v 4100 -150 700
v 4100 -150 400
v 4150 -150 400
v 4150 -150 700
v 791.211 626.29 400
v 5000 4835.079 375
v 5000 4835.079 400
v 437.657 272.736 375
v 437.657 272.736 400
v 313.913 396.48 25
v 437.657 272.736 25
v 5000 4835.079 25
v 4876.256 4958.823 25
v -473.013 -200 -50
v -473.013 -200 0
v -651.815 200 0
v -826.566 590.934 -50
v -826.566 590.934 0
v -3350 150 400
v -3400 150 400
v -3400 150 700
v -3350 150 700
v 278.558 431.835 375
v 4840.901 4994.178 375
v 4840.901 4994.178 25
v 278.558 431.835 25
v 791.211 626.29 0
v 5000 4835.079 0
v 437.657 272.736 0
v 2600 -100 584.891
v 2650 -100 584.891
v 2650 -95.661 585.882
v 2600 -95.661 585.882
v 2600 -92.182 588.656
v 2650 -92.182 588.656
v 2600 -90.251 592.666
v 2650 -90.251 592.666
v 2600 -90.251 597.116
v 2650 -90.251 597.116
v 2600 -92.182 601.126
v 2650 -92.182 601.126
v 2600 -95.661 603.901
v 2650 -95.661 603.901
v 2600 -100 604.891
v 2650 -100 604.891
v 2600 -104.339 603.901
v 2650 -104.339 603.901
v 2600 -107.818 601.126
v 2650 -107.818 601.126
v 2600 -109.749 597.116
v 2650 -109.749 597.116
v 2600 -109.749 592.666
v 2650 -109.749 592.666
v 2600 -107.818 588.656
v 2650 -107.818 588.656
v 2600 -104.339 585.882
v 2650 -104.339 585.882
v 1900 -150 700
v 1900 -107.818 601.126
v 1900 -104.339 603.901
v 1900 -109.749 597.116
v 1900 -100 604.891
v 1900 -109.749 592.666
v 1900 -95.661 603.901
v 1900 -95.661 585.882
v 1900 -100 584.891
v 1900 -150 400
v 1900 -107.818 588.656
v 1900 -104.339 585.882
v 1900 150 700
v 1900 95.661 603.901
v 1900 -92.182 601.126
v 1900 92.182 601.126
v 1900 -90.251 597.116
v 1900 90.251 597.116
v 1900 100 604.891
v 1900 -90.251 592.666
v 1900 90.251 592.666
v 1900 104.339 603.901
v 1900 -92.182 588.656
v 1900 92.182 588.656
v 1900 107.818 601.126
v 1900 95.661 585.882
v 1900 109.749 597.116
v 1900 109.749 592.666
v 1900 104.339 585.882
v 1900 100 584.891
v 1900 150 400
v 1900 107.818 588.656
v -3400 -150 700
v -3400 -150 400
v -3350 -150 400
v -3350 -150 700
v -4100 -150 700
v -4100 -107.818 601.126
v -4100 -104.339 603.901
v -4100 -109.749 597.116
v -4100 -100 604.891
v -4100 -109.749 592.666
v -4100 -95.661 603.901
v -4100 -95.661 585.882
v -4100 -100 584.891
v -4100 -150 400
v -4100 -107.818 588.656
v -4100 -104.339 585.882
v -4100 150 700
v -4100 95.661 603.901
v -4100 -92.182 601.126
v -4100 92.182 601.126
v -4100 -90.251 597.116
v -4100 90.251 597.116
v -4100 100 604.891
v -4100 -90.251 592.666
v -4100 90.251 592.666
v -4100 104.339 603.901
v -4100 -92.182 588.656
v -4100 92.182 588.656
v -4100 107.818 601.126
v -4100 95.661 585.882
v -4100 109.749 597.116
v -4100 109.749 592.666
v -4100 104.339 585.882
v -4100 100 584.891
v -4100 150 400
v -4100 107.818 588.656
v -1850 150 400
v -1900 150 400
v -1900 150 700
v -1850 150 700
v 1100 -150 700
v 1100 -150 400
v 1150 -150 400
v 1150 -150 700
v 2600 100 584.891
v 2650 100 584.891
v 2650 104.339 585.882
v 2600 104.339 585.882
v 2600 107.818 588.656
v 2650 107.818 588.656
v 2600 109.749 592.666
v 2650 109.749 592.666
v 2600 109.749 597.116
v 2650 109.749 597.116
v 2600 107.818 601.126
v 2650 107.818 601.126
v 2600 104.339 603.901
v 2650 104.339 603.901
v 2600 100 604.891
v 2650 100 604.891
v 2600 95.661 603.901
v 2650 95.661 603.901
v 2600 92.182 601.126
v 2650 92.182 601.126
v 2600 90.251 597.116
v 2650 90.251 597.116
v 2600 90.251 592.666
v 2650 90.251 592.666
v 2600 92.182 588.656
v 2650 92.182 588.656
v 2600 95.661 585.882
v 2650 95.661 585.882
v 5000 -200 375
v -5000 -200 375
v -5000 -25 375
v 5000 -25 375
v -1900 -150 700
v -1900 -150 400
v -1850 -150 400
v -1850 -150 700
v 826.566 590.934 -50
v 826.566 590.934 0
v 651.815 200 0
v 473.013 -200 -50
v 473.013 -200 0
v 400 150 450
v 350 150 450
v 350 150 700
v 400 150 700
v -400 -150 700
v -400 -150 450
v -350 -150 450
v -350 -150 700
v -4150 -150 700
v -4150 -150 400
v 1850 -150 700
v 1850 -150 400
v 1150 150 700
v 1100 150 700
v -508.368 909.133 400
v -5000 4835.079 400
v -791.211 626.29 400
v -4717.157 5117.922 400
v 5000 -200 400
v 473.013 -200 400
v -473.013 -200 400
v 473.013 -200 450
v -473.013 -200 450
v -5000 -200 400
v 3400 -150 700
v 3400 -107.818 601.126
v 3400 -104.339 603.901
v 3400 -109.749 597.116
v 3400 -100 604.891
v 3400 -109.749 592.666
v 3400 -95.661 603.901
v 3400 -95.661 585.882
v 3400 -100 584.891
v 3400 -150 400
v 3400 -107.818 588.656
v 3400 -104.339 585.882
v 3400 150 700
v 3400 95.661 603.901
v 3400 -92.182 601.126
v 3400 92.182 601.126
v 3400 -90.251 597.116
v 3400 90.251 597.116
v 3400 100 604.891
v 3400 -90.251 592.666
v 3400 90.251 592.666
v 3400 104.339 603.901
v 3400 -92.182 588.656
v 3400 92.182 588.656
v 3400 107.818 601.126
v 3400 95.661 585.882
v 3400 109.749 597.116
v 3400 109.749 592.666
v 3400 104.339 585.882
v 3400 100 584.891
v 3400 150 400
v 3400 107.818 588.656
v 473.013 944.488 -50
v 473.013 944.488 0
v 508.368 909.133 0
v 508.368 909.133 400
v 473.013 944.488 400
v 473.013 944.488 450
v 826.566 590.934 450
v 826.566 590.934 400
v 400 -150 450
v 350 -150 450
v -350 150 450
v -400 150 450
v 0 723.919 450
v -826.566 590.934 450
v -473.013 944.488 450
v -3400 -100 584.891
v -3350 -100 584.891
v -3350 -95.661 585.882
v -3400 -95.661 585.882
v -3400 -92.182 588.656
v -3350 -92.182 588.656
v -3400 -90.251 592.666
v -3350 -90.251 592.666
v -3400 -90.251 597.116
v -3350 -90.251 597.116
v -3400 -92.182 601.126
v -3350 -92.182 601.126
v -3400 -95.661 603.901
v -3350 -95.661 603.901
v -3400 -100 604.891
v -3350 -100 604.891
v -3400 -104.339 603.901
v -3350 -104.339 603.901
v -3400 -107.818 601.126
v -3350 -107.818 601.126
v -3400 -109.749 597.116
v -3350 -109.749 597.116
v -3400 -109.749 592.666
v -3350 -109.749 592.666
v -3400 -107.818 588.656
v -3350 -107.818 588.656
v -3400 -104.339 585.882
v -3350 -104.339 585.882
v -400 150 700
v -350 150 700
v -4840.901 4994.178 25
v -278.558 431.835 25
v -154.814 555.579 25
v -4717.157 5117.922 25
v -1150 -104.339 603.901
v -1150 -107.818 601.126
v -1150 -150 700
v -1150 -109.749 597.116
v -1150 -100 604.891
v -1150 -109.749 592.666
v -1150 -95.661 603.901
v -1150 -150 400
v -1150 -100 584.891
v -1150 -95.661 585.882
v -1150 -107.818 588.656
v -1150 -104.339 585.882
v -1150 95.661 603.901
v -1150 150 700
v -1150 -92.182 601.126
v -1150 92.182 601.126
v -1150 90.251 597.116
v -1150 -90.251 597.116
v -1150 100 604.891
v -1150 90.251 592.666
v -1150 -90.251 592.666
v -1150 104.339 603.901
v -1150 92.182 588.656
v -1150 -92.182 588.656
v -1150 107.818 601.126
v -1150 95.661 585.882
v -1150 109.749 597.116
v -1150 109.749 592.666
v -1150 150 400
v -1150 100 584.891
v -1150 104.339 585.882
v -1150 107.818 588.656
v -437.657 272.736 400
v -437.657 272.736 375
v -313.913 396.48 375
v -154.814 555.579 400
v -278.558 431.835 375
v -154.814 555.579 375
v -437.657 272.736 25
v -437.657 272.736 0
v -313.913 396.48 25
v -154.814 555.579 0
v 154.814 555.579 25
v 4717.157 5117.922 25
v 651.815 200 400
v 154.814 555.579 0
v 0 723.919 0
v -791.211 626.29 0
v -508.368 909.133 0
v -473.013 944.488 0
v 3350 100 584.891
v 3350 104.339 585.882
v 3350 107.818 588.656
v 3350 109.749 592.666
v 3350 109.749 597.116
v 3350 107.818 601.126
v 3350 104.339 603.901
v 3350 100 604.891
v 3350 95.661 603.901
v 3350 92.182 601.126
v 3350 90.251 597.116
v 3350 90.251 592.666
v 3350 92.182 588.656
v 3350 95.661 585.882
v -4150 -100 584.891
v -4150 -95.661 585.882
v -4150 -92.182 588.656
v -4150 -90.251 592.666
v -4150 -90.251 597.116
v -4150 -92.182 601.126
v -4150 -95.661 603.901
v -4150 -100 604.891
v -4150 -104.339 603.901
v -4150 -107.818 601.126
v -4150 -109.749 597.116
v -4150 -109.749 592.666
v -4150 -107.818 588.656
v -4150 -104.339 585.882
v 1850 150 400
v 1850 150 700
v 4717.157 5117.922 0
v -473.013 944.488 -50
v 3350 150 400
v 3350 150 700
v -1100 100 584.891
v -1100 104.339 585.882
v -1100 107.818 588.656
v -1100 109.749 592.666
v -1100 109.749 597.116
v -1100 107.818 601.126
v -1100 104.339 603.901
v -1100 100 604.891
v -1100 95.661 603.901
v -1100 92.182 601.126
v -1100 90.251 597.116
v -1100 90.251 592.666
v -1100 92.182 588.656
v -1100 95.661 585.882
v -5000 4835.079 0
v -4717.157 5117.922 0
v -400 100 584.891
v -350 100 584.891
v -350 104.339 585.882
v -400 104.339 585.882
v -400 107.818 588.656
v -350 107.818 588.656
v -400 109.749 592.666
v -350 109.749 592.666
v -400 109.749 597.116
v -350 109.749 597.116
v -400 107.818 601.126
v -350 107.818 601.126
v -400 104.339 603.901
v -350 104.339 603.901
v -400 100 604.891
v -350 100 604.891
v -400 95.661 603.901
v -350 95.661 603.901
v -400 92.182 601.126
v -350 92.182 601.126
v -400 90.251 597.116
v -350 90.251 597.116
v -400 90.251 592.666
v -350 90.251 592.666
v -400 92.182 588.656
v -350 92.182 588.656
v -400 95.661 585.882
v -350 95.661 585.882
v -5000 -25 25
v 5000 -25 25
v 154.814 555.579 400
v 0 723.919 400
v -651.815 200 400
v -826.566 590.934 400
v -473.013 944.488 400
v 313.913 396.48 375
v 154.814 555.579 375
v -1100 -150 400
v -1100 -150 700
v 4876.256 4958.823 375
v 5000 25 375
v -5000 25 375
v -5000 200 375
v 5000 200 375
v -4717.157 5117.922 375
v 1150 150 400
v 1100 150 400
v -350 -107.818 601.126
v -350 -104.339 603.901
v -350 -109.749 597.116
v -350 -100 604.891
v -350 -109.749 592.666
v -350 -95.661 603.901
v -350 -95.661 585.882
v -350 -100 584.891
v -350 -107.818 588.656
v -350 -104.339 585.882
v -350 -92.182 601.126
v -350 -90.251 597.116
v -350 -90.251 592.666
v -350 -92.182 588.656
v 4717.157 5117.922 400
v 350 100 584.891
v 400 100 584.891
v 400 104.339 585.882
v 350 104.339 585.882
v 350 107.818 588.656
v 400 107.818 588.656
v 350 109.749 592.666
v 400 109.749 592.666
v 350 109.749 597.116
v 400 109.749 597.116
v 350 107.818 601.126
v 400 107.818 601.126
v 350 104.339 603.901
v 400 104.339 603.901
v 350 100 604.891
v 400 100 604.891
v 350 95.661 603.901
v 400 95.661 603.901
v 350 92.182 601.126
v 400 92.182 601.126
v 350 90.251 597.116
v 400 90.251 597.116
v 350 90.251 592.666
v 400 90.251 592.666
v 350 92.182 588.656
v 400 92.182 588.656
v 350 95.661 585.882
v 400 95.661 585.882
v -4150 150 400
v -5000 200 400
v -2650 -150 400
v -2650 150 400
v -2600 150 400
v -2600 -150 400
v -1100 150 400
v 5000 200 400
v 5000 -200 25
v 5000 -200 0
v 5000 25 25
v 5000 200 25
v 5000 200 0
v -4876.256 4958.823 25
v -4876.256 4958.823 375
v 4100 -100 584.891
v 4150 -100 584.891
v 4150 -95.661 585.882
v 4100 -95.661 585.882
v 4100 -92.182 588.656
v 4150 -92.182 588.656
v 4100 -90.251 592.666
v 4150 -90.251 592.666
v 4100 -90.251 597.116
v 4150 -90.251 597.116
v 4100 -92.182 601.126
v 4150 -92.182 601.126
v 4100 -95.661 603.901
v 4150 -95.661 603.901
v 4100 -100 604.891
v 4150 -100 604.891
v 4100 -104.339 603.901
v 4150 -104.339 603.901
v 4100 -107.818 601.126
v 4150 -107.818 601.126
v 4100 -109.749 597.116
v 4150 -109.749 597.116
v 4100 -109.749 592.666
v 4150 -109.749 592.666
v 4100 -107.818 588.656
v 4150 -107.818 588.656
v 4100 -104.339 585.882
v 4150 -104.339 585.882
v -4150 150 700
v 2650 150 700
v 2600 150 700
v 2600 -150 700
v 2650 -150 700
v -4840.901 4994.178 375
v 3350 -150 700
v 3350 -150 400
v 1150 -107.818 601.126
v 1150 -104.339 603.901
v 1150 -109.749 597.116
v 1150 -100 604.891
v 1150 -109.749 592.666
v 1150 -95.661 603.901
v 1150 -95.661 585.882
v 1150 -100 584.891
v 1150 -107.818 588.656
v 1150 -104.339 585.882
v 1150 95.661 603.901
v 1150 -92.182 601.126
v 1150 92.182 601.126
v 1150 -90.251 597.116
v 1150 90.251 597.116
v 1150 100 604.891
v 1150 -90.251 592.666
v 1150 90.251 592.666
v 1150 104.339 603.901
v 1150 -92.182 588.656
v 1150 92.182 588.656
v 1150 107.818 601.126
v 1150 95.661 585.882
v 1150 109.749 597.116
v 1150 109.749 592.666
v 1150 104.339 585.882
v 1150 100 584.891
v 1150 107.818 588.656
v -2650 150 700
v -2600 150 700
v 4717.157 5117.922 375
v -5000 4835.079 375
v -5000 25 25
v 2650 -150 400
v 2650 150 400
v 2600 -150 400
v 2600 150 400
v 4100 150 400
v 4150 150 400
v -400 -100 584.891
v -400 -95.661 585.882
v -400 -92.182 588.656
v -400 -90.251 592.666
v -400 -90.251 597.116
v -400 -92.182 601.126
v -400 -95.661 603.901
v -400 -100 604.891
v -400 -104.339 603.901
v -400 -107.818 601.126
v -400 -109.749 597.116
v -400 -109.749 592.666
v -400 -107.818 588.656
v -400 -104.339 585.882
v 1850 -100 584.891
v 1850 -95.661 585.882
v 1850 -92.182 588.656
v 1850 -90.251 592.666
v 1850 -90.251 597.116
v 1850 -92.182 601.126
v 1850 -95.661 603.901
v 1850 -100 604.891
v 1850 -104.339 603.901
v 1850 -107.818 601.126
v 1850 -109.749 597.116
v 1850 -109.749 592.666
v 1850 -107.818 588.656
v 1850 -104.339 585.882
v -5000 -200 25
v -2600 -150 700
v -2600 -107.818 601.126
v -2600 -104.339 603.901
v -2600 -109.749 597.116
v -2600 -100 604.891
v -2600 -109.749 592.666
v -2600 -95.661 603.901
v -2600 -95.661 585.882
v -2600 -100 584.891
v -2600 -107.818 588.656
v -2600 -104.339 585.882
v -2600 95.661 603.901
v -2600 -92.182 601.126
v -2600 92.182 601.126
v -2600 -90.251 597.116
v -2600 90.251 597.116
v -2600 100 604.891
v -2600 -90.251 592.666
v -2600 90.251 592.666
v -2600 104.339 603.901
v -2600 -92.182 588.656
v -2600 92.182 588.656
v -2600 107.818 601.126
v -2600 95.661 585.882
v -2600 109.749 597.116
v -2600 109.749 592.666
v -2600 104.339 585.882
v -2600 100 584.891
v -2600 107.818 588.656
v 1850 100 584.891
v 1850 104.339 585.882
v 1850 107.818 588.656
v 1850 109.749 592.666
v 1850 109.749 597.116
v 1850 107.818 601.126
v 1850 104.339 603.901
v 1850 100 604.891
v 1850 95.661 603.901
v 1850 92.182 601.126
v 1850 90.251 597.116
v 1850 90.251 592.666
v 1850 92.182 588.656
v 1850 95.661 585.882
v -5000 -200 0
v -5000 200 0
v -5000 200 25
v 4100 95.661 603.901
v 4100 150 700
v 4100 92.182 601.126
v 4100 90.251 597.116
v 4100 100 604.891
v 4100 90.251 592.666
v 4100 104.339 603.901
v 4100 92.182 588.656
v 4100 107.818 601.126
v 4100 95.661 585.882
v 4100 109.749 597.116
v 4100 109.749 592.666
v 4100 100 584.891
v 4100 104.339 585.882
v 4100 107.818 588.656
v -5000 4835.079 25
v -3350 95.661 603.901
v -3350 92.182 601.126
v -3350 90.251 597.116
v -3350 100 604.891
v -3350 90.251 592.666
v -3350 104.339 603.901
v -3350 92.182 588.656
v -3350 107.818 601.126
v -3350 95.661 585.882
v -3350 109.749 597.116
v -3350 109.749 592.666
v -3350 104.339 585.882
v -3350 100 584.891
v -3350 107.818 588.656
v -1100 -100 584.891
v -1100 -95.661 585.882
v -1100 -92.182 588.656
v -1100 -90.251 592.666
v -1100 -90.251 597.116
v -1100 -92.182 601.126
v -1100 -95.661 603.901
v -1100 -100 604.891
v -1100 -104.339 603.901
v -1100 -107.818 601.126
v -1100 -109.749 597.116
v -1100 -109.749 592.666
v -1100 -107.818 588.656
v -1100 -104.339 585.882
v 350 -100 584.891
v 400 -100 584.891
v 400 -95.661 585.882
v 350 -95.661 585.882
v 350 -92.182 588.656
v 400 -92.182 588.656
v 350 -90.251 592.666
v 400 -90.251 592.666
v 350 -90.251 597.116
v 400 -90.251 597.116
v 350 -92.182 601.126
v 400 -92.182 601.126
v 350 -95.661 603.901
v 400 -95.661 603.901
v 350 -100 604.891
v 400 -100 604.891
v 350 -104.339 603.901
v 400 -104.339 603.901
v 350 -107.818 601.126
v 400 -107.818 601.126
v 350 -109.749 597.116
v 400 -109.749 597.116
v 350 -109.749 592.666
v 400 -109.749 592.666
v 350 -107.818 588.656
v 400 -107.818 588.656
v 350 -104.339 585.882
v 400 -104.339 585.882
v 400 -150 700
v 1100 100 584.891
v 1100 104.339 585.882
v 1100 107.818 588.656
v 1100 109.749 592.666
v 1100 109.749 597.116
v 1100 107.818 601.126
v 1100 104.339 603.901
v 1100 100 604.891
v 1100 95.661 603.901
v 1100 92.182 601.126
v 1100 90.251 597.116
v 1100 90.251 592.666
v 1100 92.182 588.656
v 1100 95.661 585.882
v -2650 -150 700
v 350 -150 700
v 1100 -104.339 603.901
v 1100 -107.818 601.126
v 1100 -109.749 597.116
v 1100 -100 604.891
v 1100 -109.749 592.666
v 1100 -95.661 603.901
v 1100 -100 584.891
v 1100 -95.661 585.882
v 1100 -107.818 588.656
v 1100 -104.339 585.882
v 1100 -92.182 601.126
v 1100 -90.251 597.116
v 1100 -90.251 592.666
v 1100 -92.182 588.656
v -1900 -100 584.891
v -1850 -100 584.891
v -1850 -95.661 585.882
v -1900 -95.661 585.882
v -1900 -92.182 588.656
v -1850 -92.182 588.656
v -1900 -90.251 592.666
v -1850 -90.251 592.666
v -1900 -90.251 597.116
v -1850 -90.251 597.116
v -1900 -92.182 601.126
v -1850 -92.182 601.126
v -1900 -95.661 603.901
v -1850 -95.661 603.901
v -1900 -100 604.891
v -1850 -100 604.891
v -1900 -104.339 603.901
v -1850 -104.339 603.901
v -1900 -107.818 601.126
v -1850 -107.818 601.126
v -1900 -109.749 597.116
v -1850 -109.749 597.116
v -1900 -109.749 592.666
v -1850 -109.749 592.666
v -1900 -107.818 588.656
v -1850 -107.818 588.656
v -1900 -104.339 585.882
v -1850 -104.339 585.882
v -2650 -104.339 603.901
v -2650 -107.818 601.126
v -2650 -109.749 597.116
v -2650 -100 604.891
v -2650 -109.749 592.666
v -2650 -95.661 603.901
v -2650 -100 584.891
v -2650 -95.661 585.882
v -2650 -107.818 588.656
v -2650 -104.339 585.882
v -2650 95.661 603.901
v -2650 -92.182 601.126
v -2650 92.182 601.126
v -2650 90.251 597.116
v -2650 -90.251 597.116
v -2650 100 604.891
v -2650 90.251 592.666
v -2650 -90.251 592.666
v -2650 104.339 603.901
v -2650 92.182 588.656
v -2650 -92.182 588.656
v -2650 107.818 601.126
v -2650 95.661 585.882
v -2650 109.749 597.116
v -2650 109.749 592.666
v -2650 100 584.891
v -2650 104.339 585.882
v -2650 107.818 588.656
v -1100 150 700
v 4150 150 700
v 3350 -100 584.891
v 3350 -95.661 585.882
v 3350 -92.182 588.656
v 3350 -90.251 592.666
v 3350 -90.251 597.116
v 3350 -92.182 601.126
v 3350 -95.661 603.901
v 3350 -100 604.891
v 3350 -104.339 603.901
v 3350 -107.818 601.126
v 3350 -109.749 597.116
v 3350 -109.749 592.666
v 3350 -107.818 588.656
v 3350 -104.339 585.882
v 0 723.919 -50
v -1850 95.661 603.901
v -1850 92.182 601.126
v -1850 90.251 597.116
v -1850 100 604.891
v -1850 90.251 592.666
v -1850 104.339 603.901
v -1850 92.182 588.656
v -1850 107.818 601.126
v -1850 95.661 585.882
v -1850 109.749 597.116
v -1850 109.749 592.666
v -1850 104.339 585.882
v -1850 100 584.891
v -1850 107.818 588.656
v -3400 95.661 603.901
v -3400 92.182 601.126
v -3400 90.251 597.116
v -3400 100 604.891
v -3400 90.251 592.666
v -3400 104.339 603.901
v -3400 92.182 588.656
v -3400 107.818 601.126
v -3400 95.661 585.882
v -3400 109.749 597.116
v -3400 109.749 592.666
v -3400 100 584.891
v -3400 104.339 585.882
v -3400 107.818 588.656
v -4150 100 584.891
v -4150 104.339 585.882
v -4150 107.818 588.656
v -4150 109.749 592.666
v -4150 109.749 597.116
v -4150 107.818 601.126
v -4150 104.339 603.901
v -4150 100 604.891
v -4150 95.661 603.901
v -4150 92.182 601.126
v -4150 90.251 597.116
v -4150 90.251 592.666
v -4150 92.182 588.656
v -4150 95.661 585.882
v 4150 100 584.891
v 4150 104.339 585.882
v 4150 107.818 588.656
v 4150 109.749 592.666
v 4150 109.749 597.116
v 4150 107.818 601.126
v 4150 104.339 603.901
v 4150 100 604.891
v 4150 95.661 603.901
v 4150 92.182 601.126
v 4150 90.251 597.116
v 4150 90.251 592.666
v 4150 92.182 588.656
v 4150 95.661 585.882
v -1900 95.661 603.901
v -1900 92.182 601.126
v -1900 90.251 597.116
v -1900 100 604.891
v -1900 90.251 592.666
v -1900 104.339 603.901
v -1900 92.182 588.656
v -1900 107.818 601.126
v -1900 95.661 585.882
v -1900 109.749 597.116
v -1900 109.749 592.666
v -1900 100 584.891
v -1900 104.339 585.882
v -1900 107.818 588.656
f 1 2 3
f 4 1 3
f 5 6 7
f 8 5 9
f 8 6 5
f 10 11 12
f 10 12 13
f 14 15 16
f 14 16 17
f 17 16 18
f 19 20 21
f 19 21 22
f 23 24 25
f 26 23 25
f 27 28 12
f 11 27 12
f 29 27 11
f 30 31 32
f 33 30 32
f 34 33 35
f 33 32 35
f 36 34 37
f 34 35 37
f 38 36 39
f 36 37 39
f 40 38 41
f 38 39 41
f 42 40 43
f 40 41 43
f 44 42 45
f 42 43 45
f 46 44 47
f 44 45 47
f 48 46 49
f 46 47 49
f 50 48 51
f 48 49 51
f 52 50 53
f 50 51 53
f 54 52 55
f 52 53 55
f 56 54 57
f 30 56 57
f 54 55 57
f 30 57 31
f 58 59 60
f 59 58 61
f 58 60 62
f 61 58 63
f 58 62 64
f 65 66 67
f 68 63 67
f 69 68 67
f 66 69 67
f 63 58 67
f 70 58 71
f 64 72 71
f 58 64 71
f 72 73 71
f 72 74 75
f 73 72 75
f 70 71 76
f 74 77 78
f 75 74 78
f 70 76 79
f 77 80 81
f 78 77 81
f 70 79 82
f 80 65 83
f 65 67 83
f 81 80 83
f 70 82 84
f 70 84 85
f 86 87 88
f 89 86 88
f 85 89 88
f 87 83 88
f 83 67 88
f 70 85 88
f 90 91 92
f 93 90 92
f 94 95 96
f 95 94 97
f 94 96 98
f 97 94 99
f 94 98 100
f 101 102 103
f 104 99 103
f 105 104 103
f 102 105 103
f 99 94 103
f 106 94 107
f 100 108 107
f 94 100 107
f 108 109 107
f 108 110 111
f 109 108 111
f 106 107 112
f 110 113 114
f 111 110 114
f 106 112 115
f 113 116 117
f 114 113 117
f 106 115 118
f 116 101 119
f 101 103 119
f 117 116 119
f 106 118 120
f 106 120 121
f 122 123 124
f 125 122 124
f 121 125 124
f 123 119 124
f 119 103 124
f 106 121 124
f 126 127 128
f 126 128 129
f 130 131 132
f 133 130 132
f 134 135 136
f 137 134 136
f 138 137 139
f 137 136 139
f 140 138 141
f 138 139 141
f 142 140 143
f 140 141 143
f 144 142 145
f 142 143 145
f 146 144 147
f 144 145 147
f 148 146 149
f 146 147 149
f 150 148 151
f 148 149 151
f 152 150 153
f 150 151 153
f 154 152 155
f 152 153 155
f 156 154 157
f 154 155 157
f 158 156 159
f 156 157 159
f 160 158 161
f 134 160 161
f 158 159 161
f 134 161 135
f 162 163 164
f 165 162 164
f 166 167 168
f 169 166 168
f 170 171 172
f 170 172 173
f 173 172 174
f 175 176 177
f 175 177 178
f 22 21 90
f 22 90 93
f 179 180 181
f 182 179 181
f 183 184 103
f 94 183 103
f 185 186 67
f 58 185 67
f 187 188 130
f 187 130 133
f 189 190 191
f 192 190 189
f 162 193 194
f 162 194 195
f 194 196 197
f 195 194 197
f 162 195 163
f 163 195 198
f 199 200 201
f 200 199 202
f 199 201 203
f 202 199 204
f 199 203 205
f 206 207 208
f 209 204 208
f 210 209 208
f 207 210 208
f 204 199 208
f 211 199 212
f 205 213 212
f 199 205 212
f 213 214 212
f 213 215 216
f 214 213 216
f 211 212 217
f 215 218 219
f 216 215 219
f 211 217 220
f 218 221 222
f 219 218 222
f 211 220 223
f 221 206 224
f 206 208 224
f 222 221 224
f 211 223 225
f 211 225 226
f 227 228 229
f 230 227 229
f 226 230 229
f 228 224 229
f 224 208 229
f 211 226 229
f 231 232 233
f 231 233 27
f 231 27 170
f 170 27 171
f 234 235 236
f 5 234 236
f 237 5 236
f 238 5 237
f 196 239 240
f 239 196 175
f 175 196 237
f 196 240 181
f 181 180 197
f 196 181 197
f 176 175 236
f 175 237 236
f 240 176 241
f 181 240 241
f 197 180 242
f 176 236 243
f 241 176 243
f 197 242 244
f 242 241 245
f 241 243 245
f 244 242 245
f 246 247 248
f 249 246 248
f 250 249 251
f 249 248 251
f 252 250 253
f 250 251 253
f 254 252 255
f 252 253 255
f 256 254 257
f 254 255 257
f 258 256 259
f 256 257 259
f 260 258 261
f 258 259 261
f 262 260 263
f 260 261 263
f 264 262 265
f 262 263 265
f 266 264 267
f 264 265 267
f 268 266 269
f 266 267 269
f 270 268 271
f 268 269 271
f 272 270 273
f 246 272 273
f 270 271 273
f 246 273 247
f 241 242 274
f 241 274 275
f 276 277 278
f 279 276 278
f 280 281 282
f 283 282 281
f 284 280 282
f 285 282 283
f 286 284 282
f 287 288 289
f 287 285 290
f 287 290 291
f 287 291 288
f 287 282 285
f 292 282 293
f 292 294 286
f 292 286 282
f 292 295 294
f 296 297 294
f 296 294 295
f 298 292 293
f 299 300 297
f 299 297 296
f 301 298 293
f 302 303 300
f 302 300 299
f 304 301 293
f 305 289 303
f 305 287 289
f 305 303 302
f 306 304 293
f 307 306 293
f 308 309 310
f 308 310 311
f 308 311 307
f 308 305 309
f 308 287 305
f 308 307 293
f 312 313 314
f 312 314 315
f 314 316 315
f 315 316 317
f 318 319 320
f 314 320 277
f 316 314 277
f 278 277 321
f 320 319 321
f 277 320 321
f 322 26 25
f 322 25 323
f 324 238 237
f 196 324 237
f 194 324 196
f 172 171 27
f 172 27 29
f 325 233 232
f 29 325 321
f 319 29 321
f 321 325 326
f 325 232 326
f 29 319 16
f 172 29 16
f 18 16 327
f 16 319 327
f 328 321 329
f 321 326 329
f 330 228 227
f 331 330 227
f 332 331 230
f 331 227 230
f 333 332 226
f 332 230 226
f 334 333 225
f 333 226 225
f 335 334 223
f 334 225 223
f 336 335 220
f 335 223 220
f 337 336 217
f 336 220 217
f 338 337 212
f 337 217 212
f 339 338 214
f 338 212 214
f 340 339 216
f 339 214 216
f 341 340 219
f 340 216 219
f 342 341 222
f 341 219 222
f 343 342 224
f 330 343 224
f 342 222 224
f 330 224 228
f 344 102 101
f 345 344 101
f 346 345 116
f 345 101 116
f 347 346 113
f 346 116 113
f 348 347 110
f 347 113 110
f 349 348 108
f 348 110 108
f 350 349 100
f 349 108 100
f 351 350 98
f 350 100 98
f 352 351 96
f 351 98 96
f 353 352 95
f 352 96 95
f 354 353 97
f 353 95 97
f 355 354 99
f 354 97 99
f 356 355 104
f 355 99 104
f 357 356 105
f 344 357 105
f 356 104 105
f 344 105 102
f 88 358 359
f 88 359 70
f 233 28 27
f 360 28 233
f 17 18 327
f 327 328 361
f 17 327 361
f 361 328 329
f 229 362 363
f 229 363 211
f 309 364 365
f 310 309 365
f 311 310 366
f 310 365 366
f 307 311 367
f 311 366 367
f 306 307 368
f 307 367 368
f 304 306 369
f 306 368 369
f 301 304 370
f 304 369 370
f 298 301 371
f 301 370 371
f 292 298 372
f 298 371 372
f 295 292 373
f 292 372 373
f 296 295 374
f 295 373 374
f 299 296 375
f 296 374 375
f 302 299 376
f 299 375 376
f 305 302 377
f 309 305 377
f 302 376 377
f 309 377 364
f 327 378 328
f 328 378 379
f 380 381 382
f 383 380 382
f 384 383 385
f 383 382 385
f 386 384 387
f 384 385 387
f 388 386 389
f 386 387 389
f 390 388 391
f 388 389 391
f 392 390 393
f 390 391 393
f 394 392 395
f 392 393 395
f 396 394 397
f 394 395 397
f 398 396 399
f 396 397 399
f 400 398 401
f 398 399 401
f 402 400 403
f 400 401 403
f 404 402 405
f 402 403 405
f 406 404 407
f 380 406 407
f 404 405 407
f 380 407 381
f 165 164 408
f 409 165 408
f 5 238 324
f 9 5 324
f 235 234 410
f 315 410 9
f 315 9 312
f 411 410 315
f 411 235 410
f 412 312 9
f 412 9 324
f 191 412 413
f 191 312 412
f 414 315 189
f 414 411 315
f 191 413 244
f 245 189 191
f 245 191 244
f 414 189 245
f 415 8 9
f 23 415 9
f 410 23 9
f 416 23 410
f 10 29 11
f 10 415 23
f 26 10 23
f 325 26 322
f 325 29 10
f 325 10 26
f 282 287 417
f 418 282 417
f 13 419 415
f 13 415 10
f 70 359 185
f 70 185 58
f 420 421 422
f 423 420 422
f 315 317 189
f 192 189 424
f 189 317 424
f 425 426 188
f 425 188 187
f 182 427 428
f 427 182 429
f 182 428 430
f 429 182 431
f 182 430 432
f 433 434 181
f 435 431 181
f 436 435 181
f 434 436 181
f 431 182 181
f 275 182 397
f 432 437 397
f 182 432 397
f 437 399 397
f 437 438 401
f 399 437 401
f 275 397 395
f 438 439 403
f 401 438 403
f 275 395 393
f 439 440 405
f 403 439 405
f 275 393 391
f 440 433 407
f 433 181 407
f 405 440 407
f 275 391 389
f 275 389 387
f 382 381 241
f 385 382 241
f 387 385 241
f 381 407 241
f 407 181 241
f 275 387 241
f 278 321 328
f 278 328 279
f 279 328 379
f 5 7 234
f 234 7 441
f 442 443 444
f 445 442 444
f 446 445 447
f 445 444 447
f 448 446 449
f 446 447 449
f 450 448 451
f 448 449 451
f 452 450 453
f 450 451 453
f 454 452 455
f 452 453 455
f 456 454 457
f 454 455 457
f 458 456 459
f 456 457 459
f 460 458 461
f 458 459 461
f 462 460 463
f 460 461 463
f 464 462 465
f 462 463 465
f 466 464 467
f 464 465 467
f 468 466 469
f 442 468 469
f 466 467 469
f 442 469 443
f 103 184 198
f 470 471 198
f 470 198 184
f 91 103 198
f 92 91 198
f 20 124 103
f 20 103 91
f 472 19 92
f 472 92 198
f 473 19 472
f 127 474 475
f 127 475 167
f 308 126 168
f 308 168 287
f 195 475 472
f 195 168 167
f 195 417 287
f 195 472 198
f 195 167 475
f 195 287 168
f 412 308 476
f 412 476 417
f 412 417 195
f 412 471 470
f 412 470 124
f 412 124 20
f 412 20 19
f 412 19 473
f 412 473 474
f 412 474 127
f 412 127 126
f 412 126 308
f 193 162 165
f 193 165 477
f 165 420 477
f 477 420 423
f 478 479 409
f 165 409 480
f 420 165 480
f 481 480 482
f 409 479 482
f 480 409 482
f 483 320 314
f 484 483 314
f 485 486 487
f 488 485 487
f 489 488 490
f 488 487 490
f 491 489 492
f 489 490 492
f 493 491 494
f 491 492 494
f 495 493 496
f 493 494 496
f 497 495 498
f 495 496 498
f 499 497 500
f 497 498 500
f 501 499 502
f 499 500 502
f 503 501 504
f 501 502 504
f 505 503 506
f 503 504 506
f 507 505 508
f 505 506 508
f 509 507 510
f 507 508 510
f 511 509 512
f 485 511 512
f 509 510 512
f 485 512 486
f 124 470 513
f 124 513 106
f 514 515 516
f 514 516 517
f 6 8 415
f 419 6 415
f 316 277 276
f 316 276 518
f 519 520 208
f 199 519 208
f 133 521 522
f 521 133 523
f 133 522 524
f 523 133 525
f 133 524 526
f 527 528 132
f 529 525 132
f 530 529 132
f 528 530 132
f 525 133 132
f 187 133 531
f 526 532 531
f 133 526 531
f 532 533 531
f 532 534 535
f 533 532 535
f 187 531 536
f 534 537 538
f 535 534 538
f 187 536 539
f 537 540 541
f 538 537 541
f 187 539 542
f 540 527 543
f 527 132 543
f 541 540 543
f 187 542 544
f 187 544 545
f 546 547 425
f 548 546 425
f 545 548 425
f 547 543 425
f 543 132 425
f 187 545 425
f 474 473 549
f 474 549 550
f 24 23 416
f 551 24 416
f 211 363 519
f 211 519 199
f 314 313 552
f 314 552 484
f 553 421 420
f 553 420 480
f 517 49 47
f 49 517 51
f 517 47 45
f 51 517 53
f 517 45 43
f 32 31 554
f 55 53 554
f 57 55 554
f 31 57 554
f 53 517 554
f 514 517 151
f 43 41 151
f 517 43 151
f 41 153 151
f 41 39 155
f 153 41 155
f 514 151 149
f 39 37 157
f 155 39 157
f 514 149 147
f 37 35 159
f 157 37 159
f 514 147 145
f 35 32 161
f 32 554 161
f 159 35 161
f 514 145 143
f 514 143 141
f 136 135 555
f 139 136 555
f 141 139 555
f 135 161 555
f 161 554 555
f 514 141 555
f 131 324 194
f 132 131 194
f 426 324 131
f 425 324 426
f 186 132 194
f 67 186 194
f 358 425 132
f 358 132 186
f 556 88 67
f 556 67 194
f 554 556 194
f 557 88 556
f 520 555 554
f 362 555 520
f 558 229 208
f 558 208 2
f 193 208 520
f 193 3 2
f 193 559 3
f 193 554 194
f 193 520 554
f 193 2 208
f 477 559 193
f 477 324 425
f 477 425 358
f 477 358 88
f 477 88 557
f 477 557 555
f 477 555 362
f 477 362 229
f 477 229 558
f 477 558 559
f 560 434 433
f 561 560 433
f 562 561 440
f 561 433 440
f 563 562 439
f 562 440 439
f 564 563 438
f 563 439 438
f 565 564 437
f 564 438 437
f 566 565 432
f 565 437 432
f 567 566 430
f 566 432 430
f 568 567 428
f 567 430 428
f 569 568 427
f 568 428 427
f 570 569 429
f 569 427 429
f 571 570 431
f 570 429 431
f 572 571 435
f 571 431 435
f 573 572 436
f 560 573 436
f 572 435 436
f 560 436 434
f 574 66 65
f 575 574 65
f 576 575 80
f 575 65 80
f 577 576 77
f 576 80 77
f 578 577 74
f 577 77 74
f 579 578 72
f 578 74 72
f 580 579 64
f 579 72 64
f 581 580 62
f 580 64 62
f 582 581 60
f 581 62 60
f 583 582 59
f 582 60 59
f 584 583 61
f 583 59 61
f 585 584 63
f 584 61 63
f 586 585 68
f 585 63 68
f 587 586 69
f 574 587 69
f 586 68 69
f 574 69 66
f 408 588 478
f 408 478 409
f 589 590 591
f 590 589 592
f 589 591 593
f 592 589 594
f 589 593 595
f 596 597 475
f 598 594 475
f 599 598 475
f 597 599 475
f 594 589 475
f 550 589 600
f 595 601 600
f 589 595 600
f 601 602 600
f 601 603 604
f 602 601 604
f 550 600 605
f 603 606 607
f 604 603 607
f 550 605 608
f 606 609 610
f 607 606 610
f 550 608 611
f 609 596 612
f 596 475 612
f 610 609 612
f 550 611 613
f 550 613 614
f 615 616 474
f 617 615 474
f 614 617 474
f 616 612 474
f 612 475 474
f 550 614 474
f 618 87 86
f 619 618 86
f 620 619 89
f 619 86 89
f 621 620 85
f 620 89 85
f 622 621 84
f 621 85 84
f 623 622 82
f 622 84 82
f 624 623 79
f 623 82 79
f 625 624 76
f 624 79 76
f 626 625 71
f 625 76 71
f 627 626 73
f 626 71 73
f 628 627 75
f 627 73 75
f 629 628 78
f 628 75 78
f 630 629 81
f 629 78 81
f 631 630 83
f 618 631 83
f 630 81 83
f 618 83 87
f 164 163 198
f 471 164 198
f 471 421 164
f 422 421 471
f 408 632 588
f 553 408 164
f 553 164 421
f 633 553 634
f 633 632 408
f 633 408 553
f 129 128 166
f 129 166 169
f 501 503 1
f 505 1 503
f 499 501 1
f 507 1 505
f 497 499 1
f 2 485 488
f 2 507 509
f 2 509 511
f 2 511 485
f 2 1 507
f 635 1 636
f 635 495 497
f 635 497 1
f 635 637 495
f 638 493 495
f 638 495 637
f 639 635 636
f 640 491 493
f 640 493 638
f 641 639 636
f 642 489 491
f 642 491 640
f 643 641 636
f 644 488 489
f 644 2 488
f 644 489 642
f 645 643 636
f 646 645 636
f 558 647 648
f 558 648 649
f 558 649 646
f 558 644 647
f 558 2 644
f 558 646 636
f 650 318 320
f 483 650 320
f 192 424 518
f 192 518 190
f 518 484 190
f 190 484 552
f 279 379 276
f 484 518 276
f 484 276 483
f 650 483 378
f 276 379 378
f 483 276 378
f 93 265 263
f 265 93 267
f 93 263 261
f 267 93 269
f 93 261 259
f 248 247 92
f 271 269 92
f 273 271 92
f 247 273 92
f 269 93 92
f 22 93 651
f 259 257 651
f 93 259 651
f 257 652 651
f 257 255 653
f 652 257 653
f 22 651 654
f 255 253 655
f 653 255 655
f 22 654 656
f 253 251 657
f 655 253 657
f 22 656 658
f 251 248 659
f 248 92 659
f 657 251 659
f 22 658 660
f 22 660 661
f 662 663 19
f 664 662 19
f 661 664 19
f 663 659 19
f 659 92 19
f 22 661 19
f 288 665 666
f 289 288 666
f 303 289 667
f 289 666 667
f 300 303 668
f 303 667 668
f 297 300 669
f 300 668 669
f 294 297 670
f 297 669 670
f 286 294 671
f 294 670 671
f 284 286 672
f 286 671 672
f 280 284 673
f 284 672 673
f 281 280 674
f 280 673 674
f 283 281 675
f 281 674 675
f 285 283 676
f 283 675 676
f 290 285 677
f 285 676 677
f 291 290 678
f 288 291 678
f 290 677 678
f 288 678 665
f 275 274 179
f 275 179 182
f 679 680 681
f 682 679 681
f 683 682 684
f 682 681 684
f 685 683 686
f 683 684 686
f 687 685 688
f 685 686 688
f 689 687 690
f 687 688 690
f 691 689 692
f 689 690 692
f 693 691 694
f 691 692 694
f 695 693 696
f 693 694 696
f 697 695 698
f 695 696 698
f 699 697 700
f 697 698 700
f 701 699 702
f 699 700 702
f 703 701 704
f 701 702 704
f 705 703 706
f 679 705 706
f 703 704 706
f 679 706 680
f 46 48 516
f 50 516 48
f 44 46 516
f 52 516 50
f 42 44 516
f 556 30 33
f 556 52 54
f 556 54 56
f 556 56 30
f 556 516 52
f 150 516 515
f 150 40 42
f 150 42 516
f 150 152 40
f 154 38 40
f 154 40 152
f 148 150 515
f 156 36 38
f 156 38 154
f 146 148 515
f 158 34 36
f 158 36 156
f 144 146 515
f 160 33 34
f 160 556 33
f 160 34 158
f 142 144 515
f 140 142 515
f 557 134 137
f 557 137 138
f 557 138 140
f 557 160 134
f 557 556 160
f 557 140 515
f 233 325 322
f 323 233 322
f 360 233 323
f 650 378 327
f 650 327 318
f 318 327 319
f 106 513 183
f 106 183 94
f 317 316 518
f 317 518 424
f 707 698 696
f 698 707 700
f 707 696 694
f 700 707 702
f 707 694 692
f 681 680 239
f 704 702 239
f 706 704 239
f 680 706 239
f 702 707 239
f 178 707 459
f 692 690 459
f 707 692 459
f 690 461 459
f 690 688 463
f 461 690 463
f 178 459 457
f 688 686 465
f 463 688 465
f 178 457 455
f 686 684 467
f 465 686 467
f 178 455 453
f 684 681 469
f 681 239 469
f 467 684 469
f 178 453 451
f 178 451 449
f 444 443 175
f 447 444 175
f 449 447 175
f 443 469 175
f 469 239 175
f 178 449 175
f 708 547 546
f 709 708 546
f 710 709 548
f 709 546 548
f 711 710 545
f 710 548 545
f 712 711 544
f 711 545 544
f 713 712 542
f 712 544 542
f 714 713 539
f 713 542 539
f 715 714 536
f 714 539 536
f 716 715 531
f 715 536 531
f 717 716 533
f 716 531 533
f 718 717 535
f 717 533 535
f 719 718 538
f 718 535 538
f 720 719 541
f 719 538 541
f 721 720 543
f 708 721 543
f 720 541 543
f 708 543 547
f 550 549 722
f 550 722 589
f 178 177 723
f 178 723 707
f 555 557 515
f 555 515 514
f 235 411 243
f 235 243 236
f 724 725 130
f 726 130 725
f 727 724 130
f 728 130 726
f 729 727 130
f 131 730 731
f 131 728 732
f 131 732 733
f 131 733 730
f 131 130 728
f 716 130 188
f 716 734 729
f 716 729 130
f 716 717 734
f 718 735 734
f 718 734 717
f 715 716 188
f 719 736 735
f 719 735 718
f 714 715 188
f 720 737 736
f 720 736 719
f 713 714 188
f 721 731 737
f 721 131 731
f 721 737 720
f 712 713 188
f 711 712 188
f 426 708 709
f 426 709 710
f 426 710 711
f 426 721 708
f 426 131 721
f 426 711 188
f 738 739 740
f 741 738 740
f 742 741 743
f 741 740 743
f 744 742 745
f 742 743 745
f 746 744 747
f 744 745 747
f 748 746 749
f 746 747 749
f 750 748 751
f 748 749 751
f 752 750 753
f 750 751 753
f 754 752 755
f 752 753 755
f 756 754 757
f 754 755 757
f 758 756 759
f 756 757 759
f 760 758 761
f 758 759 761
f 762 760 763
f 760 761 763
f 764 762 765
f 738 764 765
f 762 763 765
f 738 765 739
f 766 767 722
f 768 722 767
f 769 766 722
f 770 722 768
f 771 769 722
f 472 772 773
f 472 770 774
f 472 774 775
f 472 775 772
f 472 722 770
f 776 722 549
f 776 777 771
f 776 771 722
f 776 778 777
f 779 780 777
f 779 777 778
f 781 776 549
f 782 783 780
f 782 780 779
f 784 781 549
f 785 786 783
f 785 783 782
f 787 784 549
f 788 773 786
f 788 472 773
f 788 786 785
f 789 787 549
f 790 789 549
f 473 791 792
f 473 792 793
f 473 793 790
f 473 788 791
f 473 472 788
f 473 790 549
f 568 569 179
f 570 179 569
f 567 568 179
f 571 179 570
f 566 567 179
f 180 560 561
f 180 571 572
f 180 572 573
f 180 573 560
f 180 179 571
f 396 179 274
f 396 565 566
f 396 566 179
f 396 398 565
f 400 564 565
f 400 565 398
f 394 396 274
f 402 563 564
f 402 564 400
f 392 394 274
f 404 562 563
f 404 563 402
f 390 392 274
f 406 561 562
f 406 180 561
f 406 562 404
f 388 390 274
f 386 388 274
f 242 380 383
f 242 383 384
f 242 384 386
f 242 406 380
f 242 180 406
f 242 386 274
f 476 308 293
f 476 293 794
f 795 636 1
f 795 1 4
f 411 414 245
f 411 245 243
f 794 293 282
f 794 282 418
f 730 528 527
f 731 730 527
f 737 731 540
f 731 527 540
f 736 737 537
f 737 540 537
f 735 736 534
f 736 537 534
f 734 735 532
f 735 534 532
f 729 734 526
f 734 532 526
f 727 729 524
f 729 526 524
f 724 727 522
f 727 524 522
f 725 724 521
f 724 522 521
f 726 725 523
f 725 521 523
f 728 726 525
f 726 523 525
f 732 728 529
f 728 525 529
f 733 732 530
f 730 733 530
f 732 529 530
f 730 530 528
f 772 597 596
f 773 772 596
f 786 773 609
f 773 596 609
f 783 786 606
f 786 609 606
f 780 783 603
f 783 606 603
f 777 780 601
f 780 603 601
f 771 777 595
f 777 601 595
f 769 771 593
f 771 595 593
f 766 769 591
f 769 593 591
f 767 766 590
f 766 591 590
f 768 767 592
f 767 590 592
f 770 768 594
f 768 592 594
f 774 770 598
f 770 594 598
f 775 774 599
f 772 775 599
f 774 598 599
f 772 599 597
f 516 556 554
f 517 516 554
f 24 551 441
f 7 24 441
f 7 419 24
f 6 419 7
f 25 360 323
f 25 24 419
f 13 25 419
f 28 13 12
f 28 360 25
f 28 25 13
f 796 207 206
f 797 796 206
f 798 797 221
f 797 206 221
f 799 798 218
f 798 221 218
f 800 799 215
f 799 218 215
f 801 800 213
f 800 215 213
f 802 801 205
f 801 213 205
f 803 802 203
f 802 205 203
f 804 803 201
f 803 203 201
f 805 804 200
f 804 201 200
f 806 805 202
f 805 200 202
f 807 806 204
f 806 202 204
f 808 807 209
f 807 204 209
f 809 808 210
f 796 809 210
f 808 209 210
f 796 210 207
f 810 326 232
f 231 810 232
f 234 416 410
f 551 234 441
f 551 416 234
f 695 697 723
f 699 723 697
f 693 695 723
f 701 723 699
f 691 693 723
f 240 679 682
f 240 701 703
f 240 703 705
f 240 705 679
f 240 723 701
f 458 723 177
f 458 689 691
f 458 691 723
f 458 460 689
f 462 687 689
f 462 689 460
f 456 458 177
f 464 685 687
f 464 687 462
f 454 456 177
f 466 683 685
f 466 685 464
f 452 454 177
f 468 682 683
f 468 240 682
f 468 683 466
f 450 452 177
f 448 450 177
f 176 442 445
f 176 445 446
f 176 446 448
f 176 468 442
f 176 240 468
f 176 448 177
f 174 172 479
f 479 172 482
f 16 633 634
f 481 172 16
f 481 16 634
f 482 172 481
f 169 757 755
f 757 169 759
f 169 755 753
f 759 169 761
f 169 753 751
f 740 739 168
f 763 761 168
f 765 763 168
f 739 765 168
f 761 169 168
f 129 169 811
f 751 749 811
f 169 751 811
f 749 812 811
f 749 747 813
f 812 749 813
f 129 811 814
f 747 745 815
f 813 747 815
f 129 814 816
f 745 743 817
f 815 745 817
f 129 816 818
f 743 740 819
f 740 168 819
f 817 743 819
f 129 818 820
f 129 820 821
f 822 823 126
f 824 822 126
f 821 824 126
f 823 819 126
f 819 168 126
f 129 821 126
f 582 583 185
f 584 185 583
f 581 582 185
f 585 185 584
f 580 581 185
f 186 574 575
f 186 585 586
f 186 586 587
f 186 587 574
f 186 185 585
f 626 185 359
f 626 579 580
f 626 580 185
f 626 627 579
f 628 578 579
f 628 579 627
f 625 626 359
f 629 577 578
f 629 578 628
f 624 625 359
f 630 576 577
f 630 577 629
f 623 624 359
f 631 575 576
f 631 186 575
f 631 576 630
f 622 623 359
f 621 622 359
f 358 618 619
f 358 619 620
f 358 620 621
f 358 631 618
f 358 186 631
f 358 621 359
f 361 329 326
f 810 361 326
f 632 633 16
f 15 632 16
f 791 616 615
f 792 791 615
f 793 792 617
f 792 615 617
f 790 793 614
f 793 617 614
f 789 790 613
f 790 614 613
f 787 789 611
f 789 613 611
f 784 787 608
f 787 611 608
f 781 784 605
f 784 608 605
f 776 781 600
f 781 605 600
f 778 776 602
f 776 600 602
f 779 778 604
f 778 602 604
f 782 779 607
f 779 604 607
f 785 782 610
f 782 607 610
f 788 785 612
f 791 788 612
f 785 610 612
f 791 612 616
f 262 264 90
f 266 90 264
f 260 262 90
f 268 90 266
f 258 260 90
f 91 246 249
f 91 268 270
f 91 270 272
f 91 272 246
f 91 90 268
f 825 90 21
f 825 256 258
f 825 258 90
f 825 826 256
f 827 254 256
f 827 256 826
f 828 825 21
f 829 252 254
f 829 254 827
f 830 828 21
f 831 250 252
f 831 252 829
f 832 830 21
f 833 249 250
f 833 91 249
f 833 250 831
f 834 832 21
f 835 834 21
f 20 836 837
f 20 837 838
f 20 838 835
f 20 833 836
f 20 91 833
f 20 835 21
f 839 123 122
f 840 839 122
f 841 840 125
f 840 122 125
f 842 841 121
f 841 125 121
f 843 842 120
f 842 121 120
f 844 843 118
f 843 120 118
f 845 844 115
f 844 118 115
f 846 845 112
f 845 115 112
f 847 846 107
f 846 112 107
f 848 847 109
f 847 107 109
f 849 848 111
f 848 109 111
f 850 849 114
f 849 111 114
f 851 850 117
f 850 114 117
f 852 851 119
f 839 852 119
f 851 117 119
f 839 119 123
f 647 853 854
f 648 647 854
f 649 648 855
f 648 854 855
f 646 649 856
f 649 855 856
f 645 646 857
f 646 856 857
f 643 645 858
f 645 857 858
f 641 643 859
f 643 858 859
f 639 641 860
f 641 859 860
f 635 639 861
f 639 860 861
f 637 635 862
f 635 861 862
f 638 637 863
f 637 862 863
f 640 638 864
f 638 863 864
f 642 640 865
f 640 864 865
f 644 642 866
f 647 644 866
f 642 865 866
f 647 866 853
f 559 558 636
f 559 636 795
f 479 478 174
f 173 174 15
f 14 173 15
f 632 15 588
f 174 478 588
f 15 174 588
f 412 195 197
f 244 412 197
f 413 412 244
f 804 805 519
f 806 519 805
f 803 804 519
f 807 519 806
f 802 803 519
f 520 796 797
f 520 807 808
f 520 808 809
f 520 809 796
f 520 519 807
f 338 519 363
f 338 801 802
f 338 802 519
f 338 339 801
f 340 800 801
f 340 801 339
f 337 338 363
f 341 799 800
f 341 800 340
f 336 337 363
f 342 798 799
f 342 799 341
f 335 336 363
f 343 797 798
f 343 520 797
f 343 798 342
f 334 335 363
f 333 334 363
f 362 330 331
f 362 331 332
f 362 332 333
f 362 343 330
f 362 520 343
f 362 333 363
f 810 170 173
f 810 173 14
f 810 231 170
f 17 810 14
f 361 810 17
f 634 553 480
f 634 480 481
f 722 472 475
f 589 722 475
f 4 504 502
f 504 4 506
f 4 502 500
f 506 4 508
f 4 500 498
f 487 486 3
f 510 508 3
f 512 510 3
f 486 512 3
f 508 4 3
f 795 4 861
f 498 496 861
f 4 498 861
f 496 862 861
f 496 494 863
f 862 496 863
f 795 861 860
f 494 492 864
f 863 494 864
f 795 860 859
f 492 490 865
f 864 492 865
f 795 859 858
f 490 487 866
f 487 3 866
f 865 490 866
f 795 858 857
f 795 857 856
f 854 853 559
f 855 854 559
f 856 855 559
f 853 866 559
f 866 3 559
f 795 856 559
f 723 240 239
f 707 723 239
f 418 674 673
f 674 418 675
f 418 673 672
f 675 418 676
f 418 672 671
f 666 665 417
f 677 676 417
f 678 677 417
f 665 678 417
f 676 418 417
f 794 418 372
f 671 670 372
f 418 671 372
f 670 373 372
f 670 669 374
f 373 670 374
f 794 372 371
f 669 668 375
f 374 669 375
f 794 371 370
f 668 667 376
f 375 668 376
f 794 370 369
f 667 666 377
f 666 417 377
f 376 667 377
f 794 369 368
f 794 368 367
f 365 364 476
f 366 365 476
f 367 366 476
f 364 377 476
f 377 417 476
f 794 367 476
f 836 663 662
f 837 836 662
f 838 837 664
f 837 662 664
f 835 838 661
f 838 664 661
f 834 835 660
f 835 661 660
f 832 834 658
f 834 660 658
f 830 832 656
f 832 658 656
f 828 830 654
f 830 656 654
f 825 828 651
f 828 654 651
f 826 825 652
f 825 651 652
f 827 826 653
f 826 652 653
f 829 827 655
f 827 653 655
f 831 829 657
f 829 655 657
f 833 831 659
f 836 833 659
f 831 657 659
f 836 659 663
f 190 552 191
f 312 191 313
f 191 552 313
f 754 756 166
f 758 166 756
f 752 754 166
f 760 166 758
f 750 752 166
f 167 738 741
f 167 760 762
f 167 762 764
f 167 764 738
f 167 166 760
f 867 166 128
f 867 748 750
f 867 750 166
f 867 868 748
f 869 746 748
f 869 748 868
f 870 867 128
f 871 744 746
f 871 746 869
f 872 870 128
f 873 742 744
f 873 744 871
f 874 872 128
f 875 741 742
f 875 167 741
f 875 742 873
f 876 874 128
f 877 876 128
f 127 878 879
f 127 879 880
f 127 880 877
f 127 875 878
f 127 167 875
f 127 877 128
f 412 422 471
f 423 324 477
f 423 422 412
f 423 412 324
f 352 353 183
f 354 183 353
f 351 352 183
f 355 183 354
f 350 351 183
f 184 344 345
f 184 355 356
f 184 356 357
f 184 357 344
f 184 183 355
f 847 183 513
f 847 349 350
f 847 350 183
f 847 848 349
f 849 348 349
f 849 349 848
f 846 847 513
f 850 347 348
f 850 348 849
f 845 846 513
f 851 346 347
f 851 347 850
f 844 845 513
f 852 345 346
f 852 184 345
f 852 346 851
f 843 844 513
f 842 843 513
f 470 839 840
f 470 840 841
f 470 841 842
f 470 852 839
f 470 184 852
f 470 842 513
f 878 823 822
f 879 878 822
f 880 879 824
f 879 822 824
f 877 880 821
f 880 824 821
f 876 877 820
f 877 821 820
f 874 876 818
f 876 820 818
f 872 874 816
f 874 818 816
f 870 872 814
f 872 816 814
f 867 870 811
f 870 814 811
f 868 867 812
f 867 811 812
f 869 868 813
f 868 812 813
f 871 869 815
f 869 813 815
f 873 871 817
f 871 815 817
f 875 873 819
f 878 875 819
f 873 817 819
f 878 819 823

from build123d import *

# Parameters (mm, degrees)
SKETCH1_W           = 10000
SKETCH1_H           = 400
BOSS_EXTRUDE1_DEPTH = 400
BOSS_EXTRUDE2_DEPTH = 50
BOSS_EXTRUDE3_DEPTH = 50
BOSS_EXTRUDE4_DEPTH = 400
SKETCH6_W           = 50
SKETCH6_H           = 300
BOSS_EXTRUDE6_DEPTH = 300
SKETCH7_W           = 350
SKETCH7_H           = 175
CUT_EXTRUDE1_DEPTH  = 6462
SKETCH8_W           = 350
SKETCH8_H           = 175
CUT_EXTRUDE2_DEPTH  = 6475
SKETCH9_W           = 350
SKETCH9_H           = 175
CUT_EXTRUDE3_DEPTH  = 10052
SKETCH10_R          = 10
CUT_EXTRUDE4_DEPTH  = 8436


with BuildPart() as part:
    # Sketch1 → Boss-Extrude1 (new body)
    with BuildSketch(Plane.XY):
        Rectangle(SKETCH1_W, SKETCH1_H)
    extrude(amount=BOSS_EXTRUDE1_DEPTH)

    # Sketch2 → Boss-Extrude2 (add)
    with BuildSketch(Plane.XY.offset(400)):
        Polygon((-826.565906916, 590.934493084), (-473.012516323, 944.487883678), (0, 723.918524913), (473.012516323, 944.487883678), (826.565906916, 590.934493084), (473.012516323, -200), (0, -200), (-473.012516323, -200), align=None)
    extrude(amount=BOSS_EXTRUDE2_DEPTH)

    # Sketch3 → Boss-Extrude3 (add)
    with BuildSketch(Plane(origin=(0, 0, 0), x_dir=(-1, 0, 0), z_dir=(0, 0, -1))):
        Polygon((-826.565906916, 590.934493084), (-473.012516323, -200), (473.012516323, -200), (826.565906916, 590.934493084), (473.012516323, 944.487883678), (0, 723.918524913), (-473.012516323, 944.487883678), align=None)
    extrude(amount=BOSS_EXTRUDE3_DEPTH)

    # Sketch4 → Boss-Extrude4 (add)
    with BuildSketch(Plane.XY):
        Polygon((-437.657177263, 272.73644155), (-154.814464789, 555.579154025), (-4717.157287525, 5117.921976762), (-5000, 4835.079264287), align=None)
        Polygon((154.814464789, 555.579154025), (4717.157287525, 5117.921976762), (5000, 4835.079264287), (437.657177263, 272.73644155), align=None)
    extrude(amount=BOSS_EXTRUDE4_DEPTH)

    # Sketch6 → Boss-Extrude6 (add)
    with BuildSketch(Plane.XY.offset(400)):
        with Locations((-3375, 0)):
            Rectangle(SKETCH6_W, SKETCH6_H)
        with Locations((-4125, 0)):
            Rectangle(SKETCH6_W, SKETCH6_H)
        with Locations((-2625, 0)):
            Rectangle(SKETCH6_W, SKETCH6_H)
        with Locations((-1875, 0)):
            Rectangle(SKETCH6_W, SKETCH6_H)
        with Locations((-1125, 0)):
            Rectangle(SKETCH6_W, SKETCH6_H)
        with Locations((-375, 0)):
            Rectangle(SKETCH6_W, SKETCH6_H)
        with Locations((375, 0)):
            Rectangle(SKETCH6_W, SKETCH6_H)
        with Locations((1125, 0)):
            Rectangle(SKETCH6_W, SKETCH6_H)
        with Locations((1875, 0)):
            Rectangle(SKETCH6_W, SKETCH6_H)
        with Locations((2625, 0)):
            Rectangle(SKETCH6_W, SKETCH6_H)
        with Locations((3375, 0)):
            Rectangle(SKETCH6_W, SKETCH6_H)
        with Locations((4125, 0)):
            Rectangle(SKETCH6_W, SKETCH6_H)
    extrude(amount=BOSS_EXTRUDE6_DEPTH)

    # Sketch7 → Cut-Extrude1 (cut)
    with BuildSketch(Plane(origin=(-4917.539632144, 4917.539632144, 0), x_dir=(0, 0, 1), z_dir=(-0.707106781, 0.707106781, 0))):
        with Locations((200, 195.883429419)):
            Rectangle(SKETCH7_W, SKETCH7_H)
        with Locations((200, -29.116570581)):
            Rectangle(SKETCH7_W, SKETCH7_H)
    extrude(amount=-CUT_EXTRUDE1_DEPTH, mode=Mode.SUBTRACT)

    # Sketch8 → Cut-Extrude2 (cut)
    with BuildSketch(Plane(origin=(4917.539632144, 4917.539632143, 0), x_dir=(0, 0, -1), z_dir=(0.707106781, 0.707106781, 0))):
        with Locations((-200, 195.883429419)):
            Rectangle(SKETCH8_W, SKETCH8_H)
        with Locations((-200, -29.116570581)):
            Rectangle(SKETCH8_W, SKETCH8_H)
    extrude(amount=-CUT_EXTRUDE2_DEPTH, mode=Mode.SUBTRACT)

    # Sketch9 → Cut-Extrude3 (cut)
    with BuildSketch(Plane(origin=(5000, 0, 0), x_dir=(0, 0, -1), z_dir=(1, 0, 0))):
        with Locations((-200, 112.5)):
            Rectangle(SKETCH9_W, SKETCH9_H)
        with Locations((-200, -112.5)):
            Rectangle(SKETCH9_W, SKETCH9_H)
    extrude(amount=-CUT_EXTRUDE3_DEPTH, mode=Mode.SUBTRACT)

    # Sketch10 → Cut-Extrude4 (cut)
    with BuildSketch(Plane(origin=(4150, 0, 0), x_dir=(0, 0, -1), z_dir=(1, 0, 0))):
        with Locations((-594.891195944, 100)):
            Circle(SKETCH10_R)
        with Locations((-594.891195944, -100)):
            Circle(SKETCH10_R)
    extrude(amount=-CUT_EXTRUDE4_DEPTH, mode=Mode.SUBTRACT)


solid = part.part
